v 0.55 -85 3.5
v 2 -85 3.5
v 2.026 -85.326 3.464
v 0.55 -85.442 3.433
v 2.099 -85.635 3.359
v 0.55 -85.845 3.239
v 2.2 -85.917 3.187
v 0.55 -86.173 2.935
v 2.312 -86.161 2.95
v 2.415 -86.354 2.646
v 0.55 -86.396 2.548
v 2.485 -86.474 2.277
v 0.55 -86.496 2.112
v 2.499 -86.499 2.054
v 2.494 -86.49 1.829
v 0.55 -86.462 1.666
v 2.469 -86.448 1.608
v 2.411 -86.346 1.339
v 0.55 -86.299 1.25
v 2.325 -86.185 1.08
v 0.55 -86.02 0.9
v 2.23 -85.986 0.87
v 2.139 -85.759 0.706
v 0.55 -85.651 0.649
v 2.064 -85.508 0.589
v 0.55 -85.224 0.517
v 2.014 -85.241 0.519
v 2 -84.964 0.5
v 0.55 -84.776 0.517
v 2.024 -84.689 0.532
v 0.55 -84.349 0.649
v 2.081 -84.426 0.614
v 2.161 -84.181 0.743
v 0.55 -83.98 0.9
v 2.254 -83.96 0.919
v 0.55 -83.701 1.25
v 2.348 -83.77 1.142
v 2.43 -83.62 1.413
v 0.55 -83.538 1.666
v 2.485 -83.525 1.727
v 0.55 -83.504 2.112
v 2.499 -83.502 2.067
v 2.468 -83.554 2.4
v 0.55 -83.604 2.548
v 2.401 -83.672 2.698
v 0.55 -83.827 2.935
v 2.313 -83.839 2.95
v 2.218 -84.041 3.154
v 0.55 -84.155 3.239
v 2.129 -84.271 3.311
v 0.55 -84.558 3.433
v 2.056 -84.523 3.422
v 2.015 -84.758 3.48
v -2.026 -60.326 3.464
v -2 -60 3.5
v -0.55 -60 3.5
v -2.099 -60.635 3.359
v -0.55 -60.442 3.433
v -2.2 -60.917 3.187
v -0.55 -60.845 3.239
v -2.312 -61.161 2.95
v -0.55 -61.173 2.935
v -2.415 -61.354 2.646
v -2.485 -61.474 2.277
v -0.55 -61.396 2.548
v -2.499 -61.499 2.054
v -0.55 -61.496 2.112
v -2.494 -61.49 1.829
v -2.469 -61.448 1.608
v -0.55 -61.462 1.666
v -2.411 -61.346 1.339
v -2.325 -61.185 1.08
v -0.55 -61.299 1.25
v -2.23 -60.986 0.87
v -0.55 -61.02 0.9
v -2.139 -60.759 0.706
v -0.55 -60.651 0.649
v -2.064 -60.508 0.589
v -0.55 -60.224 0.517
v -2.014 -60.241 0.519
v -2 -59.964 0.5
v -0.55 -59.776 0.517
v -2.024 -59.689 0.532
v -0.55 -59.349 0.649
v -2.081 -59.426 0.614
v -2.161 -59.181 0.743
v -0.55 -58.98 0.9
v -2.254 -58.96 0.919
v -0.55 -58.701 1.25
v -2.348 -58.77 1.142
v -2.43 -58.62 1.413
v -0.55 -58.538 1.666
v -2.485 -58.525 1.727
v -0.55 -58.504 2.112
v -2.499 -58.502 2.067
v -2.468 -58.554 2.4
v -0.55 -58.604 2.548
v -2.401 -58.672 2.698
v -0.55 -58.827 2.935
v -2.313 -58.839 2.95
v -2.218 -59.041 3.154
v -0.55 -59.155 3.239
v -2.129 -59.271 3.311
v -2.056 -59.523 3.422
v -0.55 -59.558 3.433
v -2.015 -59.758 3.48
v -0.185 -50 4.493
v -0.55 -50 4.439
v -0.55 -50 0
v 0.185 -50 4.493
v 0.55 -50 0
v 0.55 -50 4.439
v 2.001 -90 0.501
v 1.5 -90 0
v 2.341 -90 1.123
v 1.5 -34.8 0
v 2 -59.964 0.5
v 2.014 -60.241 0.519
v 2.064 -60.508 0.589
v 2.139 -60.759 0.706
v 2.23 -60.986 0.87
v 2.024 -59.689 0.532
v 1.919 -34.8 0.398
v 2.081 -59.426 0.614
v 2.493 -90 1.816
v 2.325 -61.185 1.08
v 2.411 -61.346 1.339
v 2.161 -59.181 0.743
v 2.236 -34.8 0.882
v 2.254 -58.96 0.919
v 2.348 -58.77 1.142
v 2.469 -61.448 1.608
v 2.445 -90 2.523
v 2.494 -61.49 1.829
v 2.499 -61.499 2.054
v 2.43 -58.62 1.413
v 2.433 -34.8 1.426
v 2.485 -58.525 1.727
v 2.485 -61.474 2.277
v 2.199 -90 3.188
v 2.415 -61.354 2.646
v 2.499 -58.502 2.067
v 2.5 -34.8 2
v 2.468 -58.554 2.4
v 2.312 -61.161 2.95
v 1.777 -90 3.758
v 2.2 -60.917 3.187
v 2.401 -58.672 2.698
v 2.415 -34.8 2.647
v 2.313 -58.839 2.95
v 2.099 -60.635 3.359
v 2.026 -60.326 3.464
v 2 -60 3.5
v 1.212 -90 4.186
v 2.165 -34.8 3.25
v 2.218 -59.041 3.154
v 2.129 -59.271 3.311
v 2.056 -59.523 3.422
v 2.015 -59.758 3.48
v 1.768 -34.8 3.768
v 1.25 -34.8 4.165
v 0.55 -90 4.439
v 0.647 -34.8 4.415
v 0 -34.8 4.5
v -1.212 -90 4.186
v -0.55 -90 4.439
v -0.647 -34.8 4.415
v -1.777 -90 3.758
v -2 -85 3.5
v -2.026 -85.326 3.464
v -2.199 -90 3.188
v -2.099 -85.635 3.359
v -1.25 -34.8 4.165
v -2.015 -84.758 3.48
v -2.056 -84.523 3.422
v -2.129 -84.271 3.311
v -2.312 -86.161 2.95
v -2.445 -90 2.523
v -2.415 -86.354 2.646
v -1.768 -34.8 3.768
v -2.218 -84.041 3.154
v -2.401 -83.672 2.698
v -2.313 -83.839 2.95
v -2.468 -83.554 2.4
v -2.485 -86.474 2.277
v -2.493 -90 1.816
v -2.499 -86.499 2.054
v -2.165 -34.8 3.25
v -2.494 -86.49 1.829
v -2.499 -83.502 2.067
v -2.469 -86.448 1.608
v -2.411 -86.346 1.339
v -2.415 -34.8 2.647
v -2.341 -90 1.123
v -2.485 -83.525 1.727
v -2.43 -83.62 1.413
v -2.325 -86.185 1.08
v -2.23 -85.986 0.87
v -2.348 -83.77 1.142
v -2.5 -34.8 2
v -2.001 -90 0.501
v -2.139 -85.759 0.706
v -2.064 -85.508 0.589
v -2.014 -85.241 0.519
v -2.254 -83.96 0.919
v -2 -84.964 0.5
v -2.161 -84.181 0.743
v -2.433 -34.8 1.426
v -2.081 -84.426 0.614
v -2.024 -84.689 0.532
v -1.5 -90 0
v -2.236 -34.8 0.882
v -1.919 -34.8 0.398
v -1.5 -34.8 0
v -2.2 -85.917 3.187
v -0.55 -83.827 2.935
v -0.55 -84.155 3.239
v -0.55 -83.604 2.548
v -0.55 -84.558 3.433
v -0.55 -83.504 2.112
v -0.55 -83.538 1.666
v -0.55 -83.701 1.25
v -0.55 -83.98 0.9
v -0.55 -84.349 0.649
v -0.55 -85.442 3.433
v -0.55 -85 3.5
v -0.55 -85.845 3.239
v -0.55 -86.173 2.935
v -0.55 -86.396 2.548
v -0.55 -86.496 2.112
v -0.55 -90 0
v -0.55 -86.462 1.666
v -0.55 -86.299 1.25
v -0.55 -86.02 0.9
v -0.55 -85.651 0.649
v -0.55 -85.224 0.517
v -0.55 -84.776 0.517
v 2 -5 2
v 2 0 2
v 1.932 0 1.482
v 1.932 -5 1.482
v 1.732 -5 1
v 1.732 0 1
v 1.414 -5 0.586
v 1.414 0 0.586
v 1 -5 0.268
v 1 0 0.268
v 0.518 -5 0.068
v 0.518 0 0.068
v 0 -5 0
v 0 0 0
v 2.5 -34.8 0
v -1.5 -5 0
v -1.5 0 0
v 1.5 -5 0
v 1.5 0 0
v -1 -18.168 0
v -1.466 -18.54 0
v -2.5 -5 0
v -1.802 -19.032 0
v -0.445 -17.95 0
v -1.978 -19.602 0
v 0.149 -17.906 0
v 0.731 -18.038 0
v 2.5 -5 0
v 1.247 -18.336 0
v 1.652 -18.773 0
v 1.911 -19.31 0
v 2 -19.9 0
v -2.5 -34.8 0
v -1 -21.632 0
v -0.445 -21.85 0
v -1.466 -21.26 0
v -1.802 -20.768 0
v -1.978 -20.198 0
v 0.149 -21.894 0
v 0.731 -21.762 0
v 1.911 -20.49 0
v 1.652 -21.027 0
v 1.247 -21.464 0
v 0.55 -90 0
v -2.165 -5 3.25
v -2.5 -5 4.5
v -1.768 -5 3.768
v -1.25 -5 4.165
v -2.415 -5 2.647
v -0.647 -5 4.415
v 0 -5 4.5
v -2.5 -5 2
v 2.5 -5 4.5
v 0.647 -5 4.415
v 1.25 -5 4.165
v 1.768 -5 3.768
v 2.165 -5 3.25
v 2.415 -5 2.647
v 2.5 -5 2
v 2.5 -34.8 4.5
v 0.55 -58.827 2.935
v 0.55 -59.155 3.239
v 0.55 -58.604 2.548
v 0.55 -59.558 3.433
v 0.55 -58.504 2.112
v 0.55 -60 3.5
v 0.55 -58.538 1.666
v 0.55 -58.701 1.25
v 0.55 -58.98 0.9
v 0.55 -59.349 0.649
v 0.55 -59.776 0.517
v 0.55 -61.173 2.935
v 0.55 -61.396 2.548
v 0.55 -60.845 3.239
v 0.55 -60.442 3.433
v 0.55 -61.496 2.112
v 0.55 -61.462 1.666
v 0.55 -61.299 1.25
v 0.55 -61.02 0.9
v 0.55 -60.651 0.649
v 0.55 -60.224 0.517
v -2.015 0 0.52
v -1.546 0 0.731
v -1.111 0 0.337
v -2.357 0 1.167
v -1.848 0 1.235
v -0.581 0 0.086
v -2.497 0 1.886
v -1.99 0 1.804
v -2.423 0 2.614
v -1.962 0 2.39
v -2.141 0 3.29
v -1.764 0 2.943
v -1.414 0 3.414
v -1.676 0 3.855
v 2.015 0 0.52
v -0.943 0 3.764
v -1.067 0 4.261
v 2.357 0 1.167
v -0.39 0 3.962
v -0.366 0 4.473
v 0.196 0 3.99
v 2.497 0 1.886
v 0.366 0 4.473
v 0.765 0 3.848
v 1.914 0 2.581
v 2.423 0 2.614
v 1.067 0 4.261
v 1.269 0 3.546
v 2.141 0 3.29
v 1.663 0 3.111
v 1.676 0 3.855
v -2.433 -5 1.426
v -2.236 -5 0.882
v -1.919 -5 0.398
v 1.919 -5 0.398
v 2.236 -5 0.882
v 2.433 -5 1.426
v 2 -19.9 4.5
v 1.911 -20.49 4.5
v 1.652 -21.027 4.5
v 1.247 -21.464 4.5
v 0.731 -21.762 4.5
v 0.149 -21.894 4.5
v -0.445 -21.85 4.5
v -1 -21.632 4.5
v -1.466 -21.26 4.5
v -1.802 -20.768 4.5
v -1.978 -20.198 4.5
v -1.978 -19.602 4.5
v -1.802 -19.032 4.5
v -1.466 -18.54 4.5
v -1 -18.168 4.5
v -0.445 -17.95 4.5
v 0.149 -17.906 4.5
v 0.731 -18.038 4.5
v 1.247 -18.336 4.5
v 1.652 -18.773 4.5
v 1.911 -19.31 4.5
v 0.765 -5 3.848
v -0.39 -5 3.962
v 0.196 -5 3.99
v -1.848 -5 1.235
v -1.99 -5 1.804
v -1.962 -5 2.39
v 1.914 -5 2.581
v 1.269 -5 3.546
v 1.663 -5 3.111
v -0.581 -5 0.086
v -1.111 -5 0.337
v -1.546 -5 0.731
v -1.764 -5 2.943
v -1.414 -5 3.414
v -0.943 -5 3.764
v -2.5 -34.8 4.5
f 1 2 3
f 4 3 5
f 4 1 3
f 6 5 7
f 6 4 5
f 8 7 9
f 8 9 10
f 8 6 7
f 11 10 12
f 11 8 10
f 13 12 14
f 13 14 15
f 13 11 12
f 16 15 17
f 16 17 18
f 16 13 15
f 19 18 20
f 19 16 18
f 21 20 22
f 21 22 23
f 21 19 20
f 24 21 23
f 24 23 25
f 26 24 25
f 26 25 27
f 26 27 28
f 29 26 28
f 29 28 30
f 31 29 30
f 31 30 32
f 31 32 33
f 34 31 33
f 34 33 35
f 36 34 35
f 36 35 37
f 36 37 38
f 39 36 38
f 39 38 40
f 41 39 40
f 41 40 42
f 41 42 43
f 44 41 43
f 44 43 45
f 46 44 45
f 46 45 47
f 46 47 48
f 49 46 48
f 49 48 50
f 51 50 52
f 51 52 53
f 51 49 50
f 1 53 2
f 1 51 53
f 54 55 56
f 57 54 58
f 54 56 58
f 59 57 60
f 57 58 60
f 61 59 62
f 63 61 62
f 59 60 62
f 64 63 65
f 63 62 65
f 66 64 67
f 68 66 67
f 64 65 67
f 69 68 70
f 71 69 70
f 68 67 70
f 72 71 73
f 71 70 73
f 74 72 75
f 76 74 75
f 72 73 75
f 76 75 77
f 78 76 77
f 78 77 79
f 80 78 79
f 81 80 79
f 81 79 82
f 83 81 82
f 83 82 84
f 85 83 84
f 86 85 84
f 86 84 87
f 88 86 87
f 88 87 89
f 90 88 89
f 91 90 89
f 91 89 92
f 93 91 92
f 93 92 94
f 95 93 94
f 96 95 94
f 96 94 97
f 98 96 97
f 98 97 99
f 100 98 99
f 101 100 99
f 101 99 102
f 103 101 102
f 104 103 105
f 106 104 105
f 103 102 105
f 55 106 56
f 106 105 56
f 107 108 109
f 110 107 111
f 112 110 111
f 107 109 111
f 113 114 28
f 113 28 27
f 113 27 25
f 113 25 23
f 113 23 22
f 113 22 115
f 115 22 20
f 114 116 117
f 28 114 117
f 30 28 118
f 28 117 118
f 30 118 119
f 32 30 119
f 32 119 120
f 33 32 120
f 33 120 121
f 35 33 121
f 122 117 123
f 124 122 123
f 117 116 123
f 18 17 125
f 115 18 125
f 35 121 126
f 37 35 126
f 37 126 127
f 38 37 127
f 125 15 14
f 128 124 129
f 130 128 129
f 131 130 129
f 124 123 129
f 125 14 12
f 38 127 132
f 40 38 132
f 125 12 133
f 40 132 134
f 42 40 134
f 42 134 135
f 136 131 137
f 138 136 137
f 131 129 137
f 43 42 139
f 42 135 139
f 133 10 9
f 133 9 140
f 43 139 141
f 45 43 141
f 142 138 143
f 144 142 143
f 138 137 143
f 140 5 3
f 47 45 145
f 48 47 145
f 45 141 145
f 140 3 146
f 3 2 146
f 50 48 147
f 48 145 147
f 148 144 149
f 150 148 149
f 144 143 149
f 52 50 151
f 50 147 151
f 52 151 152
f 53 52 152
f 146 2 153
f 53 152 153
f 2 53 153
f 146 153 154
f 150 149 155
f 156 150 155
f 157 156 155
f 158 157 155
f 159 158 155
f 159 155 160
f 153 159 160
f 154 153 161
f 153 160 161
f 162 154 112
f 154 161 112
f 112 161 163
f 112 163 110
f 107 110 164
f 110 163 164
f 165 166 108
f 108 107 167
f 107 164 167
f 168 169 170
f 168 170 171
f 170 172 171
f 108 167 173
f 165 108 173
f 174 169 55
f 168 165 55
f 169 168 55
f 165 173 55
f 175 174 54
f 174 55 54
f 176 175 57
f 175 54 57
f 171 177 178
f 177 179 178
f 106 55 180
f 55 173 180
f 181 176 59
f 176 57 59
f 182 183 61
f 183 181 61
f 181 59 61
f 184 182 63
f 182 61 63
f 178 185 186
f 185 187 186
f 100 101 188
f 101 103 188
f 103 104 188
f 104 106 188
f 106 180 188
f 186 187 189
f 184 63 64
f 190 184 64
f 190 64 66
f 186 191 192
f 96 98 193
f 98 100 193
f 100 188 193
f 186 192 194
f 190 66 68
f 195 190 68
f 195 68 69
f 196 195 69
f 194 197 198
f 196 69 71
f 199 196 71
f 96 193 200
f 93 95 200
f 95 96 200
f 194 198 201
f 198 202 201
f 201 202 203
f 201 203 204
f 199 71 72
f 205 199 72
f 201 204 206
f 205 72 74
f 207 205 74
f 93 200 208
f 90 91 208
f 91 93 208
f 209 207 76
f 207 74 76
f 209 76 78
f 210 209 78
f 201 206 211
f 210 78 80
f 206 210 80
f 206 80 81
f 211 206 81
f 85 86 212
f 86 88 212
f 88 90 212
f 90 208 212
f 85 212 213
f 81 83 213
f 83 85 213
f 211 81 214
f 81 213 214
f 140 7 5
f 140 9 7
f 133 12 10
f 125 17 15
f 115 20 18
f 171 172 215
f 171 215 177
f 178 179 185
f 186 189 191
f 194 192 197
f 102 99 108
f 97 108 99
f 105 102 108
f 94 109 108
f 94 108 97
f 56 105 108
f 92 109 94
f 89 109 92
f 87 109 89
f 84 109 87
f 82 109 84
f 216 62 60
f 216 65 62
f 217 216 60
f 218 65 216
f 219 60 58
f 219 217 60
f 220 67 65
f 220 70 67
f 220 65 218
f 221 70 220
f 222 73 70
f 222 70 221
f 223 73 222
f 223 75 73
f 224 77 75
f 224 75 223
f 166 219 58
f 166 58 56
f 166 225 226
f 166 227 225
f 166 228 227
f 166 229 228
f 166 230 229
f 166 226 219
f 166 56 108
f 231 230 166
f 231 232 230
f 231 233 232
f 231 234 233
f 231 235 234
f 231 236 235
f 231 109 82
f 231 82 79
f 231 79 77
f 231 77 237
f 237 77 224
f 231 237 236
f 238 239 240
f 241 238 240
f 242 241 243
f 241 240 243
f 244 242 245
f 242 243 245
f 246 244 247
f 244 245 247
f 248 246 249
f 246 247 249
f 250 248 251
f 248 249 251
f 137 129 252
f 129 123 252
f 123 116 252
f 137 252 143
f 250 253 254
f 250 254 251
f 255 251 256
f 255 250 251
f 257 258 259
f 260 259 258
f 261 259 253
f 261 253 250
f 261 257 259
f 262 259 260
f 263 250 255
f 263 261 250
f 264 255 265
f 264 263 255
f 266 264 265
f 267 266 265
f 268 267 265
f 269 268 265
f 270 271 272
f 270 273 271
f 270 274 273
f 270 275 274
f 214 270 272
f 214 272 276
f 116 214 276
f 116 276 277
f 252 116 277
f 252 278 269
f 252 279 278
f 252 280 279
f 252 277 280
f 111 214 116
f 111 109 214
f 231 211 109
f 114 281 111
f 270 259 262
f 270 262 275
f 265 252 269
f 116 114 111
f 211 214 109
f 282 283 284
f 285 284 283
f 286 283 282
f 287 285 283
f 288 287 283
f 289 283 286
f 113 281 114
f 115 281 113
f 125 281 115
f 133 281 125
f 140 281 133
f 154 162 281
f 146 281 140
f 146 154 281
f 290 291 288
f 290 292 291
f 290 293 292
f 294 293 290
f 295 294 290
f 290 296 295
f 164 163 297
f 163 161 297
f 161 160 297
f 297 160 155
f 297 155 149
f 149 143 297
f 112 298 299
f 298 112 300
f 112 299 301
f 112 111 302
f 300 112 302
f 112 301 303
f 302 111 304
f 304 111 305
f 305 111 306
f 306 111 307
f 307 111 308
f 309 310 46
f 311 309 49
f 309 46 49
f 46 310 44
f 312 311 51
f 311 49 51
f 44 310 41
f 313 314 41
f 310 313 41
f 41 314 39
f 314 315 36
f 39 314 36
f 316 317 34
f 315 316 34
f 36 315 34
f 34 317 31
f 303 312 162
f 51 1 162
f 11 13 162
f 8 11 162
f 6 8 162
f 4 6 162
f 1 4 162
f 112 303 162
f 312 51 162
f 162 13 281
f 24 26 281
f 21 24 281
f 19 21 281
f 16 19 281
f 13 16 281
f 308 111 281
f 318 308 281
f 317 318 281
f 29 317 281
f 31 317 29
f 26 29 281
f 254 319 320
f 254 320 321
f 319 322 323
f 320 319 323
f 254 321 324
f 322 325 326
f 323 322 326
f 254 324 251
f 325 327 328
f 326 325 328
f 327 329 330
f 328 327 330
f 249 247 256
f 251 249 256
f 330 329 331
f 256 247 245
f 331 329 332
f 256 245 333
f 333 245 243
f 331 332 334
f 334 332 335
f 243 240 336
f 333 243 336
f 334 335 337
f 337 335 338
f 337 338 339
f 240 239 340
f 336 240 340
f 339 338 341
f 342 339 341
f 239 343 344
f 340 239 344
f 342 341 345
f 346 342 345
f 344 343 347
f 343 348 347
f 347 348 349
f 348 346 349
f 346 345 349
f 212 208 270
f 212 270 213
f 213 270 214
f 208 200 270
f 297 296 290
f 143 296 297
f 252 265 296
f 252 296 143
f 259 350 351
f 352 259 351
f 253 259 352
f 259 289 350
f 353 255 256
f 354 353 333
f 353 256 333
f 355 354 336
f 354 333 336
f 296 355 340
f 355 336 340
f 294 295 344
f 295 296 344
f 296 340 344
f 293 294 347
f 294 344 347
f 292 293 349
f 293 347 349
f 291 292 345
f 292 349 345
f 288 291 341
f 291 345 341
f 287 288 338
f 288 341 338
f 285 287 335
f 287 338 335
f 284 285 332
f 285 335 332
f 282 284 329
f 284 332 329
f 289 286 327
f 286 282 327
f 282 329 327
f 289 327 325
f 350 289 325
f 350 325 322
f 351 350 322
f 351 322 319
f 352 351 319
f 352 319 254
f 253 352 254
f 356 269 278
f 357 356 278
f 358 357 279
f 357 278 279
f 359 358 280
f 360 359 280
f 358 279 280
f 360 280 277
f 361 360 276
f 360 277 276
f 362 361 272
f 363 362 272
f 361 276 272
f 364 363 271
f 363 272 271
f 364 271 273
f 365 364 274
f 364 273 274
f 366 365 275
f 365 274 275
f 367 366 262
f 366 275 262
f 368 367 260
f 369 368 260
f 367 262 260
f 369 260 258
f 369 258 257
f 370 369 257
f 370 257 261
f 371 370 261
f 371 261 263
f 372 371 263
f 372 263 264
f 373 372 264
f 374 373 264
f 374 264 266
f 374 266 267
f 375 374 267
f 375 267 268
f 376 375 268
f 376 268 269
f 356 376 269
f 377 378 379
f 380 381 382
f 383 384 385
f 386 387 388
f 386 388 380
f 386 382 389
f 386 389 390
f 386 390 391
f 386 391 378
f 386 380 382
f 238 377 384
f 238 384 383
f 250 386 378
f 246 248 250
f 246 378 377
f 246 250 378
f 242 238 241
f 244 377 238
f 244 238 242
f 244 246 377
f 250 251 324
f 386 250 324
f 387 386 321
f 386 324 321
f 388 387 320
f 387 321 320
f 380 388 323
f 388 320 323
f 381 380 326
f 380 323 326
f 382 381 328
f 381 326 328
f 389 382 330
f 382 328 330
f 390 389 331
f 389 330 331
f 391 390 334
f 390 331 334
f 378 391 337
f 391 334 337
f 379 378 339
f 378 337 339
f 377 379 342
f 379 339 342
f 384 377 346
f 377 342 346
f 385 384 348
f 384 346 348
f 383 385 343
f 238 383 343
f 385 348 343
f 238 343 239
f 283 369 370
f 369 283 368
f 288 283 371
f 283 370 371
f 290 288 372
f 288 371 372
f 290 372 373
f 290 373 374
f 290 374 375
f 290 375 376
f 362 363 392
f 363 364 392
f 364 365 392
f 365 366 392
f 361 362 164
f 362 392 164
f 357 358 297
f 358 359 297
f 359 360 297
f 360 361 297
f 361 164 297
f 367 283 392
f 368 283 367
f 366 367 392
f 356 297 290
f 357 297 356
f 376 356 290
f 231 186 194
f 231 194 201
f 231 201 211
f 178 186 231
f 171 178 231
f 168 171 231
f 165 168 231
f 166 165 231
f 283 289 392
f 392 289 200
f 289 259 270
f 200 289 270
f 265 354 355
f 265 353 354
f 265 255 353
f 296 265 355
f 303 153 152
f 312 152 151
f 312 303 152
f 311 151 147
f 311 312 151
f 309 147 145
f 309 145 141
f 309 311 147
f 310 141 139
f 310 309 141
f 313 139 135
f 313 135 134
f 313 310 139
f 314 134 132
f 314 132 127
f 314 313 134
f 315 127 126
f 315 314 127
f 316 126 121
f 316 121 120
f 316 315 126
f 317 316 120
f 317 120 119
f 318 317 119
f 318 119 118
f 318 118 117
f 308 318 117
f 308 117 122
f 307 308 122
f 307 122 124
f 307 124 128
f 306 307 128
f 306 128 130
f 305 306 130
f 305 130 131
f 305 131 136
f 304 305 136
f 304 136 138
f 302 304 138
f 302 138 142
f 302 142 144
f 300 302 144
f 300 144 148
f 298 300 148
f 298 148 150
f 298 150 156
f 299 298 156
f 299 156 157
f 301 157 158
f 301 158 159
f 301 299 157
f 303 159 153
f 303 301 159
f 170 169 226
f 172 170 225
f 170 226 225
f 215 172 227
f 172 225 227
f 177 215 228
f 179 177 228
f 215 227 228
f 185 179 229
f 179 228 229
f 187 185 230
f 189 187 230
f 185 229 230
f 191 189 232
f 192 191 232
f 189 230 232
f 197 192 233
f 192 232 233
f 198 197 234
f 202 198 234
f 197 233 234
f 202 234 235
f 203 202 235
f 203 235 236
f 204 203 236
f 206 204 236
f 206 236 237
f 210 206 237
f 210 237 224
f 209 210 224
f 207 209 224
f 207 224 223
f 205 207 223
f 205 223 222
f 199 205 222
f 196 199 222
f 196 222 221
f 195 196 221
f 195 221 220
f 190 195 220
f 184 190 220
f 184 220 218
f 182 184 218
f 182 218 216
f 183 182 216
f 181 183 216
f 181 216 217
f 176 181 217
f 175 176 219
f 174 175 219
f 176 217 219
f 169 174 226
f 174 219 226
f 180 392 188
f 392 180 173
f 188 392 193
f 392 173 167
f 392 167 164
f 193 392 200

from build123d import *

# Parameters (mm, degrees)
PAD_DEPTH            = 90
SKETCH004_W          = 5
SKETCH004_H          = 29.8
PAD001_DEPTH         = 4.5
SKETCH001_R          = 2
POCKET_DEPTH         = 4.501
SKETCH005_W          = 1.1
SKETCH005_H          = 40
POCKET001_DEPTH      = 4.501
SKETCH006_R          = 1.5
POCKET002_DEPTH      = 1.951
POCKET002_DEPTH_BACK = -3.051
SKETCH007_R          = 2
POCKET003_DEPTH      = 5


with BuildPart() as part:
    # Sketch → Pad (new body)
    with BuildSketch(Plane.XZ):
        with BuildLine():
            Line((-1.5, 0), (1.5, 0))
            ThreePointArc((1.5, 0), (0, 4.5), (-1.5, 0))
        make_face()
    extrude(amount=PAD_DEPTH)

    # Sketch004 → Pad001 (new body)
    with BuildSketch(Plane(origin=(0, 0, 0), x_dir=(1, 0, 0), z_dir=(0, 0, -1))):
        with Locations((0, 19.9)):
            Rectangle(SKETCH004_W, SKETCH004_H)
    extrude(amount=-PAD001_DEPTH)

    # Sketch001 → Pocket (cut, through all)
    with BuildSketch(Plane(origin=(0, 0, 0), x_dir=(1, 0, 0), z_dir=(0, 0, -1))):
        with Locations((0, 19.9)):
            Circle(SKETCH001_R)
    extrude(amount=-POCKET_DEPTH, mode=Mode.SUBTRACT)

    # Sketch005 → Pocket001 (cut, through all)
    with BuildSketch(Plane(origin=(0, 0, 0), x_dir=(1, 0, 0), z_dir=(0, 0, -1))):
        with Locations((0, 70)):
            Rectangle(SKETCH005_W, SKETCH005_H)
    extrude(amount=-POCKET001_DEPTH, mode=Mode.SUBTRACT)

    # Sketch006 → Pocket002 (cut, two sides)
    with BuildSketch(Plane(origin=(-0.55, 0, 0), x_dir=(0, 0, 1), z_dir=(1, 0, 0))) as pocket002_sk:
        with Locations((2, 60)):
            Circle(SKETCH006_R)
        with Locations((2, 85)):
            Circle(SKETCH006_R)
    extrude(amount=-POCKET002_DEPTH, mode=Mode.SUBTRACT)
    extrude(pocket002_sk.sketch, amount=-POCKET002_DEPTH_BACK, mode=Mode.SUBTRACT)

    # Sketch007 → Pocket003 (cut)
    with BuildSketch(Plane(origin=(0, 0, 0), x_dir=(1, 0, 0), z_dir=(0, 1, 0))):
        with Locations((0, -2)):
            Circle(SKETCH007_R)
    extrude(amount=-POCKET003_DEPTH, mode=Mode.SUBTRACT)


solid = part.part
